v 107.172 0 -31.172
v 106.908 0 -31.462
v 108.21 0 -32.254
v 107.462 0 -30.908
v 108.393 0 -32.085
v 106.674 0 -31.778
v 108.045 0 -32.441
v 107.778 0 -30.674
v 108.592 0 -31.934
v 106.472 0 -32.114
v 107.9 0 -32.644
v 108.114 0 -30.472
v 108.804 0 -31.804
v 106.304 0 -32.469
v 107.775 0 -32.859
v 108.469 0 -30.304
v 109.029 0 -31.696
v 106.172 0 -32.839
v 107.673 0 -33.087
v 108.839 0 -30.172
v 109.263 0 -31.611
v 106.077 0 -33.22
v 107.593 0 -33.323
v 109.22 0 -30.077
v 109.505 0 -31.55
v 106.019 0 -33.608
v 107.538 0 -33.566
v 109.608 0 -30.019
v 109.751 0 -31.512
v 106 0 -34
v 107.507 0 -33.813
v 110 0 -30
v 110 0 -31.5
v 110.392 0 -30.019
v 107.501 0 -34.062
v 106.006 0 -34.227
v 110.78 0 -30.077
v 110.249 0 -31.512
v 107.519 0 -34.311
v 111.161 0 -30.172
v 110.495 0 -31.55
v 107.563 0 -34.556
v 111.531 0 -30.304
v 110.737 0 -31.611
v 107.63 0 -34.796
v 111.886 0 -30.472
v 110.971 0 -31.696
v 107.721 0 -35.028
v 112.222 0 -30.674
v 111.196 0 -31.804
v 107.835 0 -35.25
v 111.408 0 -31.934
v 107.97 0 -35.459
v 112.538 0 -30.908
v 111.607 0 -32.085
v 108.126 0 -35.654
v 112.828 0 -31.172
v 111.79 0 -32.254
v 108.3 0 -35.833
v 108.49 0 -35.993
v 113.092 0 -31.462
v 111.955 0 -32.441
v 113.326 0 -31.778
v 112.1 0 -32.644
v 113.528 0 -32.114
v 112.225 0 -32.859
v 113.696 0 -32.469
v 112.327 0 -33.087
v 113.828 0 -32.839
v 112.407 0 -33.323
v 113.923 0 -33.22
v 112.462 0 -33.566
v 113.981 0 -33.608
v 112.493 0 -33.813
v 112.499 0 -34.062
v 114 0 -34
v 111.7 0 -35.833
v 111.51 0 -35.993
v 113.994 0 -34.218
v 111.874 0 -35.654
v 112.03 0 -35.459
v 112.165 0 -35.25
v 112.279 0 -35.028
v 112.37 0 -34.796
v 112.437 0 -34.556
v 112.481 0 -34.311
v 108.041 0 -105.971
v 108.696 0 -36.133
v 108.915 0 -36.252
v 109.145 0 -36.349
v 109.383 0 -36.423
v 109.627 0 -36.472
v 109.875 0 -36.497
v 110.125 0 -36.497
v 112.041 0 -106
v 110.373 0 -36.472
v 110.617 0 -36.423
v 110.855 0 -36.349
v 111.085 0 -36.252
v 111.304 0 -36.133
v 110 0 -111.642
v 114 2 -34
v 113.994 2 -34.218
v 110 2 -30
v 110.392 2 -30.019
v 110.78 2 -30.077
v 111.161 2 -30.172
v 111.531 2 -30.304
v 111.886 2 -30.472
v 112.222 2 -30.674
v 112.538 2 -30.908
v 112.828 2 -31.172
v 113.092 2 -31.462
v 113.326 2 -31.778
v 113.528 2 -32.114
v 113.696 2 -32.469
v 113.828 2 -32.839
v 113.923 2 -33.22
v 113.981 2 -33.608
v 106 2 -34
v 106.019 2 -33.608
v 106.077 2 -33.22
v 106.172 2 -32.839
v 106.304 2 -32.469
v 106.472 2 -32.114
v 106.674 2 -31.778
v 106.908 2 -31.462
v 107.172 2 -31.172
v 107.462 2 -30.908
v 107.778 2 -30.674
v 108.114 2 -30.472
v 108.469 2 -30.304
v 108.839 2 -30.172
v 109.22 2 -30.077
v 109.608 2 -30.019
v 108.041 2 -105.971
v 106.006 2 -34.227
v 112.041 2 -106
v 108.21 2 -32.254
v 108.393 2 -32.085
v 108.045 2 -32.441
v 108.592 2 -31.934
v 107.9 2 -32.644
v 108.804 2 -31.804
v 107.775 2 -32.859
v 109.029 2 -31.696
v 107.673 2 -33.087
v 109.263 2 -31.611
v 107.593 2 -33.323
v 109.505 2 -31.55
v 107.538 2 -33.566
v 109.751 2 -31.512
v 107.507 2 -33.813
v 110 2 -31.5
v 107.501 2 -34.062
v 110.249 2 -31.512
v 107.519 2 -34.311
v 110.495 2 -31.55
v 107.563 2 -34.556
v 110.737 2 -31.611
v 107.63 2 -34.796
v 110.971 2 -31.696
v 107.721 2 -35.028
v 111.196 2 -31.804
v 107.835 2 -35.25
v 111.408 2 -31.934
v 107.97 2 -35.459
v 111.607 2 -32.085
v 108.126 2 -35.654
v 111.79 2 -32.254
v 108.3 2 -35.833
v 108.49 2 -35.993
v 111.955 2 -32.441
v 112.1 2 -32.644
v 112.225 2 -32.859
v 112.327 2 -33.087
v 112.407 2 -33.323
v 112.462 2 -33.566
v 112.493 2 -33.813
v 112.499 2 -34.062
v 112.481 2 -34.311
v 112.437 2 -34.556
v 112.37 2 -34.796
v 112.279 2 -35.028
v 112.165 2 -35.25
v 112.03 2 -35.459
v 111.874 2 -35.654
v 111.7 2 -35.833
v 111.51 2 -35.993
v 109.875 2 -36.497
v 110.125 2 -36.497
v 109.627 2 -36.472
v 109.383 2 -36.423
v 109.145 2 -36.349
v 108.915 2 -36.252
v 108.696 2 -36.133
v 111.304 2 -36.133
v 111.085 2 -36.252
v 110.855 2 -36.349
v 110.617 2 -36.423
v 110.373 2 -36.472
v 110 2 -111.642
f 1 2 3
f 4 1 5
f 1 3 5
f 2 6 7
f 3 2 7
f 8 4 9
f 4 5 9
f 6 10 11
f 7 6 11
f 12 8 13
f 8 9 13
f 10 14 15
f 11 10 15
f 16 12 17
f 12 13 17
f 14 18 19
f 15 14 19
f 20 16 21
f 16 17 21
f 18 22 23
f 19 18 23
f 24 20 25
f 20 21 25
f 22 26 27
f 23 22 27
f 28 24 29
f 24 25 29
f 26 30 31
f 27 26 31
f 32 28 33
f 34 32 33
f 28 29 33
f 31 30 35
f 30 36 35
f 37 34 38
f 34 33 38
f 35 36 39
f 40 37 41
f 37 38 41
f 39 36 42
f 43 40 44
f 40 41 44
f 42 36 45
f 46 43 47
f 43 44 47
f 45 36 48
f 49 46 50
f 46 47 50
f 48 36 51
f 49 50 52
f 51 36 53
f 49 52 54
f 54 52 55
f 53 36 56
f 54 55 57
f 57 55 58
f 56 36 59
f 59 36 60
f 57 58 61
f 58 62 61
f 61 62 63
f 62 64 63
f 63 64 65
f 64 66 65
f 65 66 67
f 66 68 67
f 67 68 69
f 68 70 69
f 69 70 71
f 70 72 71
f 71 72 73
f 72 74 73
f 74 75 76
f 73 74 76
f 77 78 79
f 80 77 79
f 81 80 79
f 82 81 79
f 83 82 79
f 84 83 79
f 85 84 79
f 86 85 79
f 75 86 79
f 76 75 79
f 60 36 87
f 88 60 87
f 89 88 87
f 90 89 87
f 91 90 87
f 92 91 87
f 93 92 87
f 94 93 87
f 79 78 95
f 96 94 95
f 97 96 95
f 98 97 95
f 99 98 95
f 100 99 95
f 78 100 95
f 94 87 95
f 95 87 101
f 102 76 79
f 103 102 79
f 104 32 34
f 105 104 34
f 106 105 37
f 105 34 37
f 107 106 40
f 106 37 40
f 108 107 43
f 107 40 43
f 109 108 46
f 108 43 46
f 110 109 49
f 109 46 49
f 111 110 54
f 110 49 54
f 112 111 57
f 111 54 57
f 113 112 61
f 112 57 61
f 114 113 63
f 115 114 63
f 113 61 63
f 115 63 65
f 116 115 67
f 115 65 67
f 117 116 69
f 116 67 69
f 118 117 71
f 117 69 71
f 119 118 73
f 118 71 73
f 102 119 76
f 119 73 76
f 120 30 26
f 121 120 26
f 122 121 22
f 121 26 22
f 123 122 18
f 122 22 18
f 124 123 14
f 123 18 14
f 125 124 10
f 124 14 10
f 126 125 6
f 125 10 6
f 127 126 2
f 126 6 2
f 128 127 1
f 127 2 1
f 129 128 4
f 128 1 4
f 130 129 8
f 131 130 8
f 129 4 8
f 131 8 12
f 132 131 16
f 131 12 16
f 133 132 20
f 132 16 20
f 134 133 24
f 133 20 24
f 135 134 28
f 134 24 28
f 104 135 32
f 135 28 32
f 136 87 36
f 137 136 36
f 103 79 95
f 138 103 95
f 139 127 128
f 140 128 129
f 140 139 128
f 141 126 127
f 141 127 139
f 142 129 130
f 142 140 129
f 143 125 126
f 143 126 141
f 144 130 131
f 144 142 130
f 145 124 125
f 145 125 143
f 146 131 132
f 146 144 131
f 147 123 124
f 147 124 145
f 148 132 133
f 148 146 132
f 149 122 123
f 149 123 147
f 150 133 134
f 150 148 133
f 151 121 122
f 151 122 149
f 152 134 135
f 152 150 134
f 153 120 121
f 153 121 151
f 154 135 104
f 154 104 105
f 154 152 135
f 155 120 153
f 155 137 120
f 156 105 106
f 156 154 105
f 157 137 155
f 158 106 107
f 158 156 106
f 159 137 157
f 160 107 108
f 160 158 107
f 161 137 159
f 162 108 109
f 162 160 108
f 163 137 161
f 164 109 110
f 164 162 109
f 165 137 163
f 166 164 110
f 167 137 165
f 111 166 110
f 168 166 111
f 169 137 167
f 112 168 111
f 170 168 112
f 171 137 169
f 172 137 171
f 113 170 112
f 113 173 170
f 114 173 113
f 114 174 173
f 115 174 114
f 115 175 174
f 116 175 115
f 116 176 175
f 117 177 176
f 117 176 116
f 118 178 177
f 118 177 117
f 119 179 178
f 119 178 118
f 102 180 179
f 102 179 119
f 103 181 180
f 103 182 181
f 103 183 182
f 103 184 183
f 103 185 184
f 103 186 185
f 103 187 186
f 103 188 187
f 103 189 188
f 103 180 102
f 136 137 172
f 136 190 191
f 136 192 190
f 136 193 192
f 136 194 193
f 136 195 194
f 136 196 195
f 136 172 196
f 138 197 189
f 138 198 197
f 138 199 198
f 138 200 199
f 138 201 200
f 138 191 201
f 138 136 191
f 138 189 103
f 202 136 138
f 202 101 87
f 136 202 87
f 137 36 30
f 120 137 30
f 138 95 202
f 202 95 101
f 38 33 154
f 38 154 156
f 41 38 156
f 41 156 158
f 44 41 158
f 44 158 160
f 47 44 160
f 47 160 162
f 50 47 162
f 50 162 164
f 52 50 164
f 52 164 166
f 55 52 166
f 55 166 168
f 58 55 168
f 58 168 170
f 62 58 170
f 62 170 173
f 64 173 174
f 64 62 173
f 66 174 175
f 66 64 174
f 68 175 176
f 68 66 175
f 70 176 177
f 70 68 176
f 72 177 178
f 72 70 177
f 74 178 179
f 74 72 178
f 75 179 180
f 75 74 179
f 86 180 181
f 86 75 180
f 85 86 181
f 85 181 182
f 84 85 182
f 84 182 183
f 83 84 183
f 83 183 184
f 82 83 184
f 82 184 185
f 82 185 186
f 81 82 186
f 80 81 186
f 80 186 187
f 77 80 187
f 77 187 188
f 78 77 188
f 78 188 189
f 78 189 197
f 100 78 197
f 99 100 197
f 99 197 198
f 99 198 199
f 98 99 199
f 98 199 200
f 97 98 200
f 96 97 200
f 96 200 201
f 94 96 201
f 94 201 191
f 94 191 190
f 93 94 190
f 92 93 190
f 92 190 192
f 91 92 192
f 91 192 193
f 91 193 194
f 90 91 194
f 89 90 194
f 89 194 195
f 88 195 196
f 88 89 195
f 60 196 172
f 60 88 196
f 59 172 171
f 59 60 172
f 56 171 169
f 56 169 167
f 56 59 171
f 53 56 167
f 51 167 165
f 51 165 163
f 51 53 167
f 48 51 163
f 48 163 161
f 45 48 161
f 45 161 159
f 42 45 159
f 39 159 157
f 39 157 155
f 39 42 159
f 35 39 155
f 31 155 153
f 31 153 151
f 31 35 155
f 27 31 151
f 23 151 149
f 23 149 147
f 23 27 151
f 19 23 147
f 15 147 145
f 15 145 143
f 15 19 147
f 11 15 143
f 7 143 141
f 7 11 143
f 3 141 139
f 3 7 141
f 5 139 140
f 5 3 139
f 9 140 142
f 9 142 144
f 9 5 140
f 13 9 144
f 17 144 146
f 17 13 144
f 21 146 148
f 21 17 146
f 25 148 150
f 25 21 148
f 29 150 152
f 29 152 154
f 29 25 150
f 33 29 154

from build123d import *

# Parameters (mm, degrees)
SKICA1_R                 = 2
P_IDAT_VYSUNUT_M3_DEPTH  = 2
ODEBRAT_START            = -18
SKICA5_R                 = 2.5
SKICA5_R_2               = 2
ODEBRAT_VYSUNUT_M1_DEPTH = 18


with BuildPart() as part:
    # Skica1 → Přidat vysunutím3 (new body)
    # profile 1 of 2: a face of its own
    with BuildSketch(Plane(origin=(0, 0, 0), x_dir=(1, 0, 0), z_dir=(0, 1, 0))):
        with BuildLine():
            Line((108.040914438, 105.971068272), (106.006427981, 34.226677149))
            ThreePointArc((106.006427981, 34.226677149), (110.004588085, 37.999997369), (113.994081517, 34.217515135))
            Line((113.994081517, 34.217515135), (112.040914438, 106))
            Line((112.040914438, 106), (110, 111.642221926))
            Line((110, 111.642221926), (108.040914438, 105.971068272))
        make_face()
    # profile 2 of 2: a face of its own
    with BuildSketch(Plane(origin=(0, 0, 0), x_dir=(1, 0, 0), z_dir=(0, 1, 0))):
        with BuildLine():
            ThreePointArc((106, 34), (107.171572875, 31.171572875), (110, 30))
            ThreePointArc((110, 30), (112.828427125, 31.171572875), (114, 34))
            Line((114, 34), (113.994081517, 34.217515135))
            ThreePointArc((113.994081517, 34.217515135), (110.004588085, 37.999997369), (106.006427981, 34.226677149))
            Line((106.006427981, 34.226677149), (106, 34))
        make_face()
        with Locations(Location((110, 34, 0), (0, 0, 270))):
            Circle(SKICA1_R, mode=Mode.SUBTRACT)
    extrude(amount=P_IDAT_VYSUNUT_M3_DEPTH)

    # Skica5 → Odebrat vysunutím1 (cut)
    with BuildSketch(Plane(origin=(0, 2, 0), x_dir=(1, 0, 0), z_dir=(0, 1, 0)).offset(ODEBRAT_START)):
        with Locations(Location((110, 34, 0), (0, 0, 270))):
            Circle(SKICA5_R)
        with Locations((110, 34)):
            Circle(SKICA5_R_2, mode=Mode.SUBTRACT)
    extrude(amount=ODEBRAT_VYSUNUT_M1_DEPTH, mode=Mode.SUBTRACT)


solid = part.part
